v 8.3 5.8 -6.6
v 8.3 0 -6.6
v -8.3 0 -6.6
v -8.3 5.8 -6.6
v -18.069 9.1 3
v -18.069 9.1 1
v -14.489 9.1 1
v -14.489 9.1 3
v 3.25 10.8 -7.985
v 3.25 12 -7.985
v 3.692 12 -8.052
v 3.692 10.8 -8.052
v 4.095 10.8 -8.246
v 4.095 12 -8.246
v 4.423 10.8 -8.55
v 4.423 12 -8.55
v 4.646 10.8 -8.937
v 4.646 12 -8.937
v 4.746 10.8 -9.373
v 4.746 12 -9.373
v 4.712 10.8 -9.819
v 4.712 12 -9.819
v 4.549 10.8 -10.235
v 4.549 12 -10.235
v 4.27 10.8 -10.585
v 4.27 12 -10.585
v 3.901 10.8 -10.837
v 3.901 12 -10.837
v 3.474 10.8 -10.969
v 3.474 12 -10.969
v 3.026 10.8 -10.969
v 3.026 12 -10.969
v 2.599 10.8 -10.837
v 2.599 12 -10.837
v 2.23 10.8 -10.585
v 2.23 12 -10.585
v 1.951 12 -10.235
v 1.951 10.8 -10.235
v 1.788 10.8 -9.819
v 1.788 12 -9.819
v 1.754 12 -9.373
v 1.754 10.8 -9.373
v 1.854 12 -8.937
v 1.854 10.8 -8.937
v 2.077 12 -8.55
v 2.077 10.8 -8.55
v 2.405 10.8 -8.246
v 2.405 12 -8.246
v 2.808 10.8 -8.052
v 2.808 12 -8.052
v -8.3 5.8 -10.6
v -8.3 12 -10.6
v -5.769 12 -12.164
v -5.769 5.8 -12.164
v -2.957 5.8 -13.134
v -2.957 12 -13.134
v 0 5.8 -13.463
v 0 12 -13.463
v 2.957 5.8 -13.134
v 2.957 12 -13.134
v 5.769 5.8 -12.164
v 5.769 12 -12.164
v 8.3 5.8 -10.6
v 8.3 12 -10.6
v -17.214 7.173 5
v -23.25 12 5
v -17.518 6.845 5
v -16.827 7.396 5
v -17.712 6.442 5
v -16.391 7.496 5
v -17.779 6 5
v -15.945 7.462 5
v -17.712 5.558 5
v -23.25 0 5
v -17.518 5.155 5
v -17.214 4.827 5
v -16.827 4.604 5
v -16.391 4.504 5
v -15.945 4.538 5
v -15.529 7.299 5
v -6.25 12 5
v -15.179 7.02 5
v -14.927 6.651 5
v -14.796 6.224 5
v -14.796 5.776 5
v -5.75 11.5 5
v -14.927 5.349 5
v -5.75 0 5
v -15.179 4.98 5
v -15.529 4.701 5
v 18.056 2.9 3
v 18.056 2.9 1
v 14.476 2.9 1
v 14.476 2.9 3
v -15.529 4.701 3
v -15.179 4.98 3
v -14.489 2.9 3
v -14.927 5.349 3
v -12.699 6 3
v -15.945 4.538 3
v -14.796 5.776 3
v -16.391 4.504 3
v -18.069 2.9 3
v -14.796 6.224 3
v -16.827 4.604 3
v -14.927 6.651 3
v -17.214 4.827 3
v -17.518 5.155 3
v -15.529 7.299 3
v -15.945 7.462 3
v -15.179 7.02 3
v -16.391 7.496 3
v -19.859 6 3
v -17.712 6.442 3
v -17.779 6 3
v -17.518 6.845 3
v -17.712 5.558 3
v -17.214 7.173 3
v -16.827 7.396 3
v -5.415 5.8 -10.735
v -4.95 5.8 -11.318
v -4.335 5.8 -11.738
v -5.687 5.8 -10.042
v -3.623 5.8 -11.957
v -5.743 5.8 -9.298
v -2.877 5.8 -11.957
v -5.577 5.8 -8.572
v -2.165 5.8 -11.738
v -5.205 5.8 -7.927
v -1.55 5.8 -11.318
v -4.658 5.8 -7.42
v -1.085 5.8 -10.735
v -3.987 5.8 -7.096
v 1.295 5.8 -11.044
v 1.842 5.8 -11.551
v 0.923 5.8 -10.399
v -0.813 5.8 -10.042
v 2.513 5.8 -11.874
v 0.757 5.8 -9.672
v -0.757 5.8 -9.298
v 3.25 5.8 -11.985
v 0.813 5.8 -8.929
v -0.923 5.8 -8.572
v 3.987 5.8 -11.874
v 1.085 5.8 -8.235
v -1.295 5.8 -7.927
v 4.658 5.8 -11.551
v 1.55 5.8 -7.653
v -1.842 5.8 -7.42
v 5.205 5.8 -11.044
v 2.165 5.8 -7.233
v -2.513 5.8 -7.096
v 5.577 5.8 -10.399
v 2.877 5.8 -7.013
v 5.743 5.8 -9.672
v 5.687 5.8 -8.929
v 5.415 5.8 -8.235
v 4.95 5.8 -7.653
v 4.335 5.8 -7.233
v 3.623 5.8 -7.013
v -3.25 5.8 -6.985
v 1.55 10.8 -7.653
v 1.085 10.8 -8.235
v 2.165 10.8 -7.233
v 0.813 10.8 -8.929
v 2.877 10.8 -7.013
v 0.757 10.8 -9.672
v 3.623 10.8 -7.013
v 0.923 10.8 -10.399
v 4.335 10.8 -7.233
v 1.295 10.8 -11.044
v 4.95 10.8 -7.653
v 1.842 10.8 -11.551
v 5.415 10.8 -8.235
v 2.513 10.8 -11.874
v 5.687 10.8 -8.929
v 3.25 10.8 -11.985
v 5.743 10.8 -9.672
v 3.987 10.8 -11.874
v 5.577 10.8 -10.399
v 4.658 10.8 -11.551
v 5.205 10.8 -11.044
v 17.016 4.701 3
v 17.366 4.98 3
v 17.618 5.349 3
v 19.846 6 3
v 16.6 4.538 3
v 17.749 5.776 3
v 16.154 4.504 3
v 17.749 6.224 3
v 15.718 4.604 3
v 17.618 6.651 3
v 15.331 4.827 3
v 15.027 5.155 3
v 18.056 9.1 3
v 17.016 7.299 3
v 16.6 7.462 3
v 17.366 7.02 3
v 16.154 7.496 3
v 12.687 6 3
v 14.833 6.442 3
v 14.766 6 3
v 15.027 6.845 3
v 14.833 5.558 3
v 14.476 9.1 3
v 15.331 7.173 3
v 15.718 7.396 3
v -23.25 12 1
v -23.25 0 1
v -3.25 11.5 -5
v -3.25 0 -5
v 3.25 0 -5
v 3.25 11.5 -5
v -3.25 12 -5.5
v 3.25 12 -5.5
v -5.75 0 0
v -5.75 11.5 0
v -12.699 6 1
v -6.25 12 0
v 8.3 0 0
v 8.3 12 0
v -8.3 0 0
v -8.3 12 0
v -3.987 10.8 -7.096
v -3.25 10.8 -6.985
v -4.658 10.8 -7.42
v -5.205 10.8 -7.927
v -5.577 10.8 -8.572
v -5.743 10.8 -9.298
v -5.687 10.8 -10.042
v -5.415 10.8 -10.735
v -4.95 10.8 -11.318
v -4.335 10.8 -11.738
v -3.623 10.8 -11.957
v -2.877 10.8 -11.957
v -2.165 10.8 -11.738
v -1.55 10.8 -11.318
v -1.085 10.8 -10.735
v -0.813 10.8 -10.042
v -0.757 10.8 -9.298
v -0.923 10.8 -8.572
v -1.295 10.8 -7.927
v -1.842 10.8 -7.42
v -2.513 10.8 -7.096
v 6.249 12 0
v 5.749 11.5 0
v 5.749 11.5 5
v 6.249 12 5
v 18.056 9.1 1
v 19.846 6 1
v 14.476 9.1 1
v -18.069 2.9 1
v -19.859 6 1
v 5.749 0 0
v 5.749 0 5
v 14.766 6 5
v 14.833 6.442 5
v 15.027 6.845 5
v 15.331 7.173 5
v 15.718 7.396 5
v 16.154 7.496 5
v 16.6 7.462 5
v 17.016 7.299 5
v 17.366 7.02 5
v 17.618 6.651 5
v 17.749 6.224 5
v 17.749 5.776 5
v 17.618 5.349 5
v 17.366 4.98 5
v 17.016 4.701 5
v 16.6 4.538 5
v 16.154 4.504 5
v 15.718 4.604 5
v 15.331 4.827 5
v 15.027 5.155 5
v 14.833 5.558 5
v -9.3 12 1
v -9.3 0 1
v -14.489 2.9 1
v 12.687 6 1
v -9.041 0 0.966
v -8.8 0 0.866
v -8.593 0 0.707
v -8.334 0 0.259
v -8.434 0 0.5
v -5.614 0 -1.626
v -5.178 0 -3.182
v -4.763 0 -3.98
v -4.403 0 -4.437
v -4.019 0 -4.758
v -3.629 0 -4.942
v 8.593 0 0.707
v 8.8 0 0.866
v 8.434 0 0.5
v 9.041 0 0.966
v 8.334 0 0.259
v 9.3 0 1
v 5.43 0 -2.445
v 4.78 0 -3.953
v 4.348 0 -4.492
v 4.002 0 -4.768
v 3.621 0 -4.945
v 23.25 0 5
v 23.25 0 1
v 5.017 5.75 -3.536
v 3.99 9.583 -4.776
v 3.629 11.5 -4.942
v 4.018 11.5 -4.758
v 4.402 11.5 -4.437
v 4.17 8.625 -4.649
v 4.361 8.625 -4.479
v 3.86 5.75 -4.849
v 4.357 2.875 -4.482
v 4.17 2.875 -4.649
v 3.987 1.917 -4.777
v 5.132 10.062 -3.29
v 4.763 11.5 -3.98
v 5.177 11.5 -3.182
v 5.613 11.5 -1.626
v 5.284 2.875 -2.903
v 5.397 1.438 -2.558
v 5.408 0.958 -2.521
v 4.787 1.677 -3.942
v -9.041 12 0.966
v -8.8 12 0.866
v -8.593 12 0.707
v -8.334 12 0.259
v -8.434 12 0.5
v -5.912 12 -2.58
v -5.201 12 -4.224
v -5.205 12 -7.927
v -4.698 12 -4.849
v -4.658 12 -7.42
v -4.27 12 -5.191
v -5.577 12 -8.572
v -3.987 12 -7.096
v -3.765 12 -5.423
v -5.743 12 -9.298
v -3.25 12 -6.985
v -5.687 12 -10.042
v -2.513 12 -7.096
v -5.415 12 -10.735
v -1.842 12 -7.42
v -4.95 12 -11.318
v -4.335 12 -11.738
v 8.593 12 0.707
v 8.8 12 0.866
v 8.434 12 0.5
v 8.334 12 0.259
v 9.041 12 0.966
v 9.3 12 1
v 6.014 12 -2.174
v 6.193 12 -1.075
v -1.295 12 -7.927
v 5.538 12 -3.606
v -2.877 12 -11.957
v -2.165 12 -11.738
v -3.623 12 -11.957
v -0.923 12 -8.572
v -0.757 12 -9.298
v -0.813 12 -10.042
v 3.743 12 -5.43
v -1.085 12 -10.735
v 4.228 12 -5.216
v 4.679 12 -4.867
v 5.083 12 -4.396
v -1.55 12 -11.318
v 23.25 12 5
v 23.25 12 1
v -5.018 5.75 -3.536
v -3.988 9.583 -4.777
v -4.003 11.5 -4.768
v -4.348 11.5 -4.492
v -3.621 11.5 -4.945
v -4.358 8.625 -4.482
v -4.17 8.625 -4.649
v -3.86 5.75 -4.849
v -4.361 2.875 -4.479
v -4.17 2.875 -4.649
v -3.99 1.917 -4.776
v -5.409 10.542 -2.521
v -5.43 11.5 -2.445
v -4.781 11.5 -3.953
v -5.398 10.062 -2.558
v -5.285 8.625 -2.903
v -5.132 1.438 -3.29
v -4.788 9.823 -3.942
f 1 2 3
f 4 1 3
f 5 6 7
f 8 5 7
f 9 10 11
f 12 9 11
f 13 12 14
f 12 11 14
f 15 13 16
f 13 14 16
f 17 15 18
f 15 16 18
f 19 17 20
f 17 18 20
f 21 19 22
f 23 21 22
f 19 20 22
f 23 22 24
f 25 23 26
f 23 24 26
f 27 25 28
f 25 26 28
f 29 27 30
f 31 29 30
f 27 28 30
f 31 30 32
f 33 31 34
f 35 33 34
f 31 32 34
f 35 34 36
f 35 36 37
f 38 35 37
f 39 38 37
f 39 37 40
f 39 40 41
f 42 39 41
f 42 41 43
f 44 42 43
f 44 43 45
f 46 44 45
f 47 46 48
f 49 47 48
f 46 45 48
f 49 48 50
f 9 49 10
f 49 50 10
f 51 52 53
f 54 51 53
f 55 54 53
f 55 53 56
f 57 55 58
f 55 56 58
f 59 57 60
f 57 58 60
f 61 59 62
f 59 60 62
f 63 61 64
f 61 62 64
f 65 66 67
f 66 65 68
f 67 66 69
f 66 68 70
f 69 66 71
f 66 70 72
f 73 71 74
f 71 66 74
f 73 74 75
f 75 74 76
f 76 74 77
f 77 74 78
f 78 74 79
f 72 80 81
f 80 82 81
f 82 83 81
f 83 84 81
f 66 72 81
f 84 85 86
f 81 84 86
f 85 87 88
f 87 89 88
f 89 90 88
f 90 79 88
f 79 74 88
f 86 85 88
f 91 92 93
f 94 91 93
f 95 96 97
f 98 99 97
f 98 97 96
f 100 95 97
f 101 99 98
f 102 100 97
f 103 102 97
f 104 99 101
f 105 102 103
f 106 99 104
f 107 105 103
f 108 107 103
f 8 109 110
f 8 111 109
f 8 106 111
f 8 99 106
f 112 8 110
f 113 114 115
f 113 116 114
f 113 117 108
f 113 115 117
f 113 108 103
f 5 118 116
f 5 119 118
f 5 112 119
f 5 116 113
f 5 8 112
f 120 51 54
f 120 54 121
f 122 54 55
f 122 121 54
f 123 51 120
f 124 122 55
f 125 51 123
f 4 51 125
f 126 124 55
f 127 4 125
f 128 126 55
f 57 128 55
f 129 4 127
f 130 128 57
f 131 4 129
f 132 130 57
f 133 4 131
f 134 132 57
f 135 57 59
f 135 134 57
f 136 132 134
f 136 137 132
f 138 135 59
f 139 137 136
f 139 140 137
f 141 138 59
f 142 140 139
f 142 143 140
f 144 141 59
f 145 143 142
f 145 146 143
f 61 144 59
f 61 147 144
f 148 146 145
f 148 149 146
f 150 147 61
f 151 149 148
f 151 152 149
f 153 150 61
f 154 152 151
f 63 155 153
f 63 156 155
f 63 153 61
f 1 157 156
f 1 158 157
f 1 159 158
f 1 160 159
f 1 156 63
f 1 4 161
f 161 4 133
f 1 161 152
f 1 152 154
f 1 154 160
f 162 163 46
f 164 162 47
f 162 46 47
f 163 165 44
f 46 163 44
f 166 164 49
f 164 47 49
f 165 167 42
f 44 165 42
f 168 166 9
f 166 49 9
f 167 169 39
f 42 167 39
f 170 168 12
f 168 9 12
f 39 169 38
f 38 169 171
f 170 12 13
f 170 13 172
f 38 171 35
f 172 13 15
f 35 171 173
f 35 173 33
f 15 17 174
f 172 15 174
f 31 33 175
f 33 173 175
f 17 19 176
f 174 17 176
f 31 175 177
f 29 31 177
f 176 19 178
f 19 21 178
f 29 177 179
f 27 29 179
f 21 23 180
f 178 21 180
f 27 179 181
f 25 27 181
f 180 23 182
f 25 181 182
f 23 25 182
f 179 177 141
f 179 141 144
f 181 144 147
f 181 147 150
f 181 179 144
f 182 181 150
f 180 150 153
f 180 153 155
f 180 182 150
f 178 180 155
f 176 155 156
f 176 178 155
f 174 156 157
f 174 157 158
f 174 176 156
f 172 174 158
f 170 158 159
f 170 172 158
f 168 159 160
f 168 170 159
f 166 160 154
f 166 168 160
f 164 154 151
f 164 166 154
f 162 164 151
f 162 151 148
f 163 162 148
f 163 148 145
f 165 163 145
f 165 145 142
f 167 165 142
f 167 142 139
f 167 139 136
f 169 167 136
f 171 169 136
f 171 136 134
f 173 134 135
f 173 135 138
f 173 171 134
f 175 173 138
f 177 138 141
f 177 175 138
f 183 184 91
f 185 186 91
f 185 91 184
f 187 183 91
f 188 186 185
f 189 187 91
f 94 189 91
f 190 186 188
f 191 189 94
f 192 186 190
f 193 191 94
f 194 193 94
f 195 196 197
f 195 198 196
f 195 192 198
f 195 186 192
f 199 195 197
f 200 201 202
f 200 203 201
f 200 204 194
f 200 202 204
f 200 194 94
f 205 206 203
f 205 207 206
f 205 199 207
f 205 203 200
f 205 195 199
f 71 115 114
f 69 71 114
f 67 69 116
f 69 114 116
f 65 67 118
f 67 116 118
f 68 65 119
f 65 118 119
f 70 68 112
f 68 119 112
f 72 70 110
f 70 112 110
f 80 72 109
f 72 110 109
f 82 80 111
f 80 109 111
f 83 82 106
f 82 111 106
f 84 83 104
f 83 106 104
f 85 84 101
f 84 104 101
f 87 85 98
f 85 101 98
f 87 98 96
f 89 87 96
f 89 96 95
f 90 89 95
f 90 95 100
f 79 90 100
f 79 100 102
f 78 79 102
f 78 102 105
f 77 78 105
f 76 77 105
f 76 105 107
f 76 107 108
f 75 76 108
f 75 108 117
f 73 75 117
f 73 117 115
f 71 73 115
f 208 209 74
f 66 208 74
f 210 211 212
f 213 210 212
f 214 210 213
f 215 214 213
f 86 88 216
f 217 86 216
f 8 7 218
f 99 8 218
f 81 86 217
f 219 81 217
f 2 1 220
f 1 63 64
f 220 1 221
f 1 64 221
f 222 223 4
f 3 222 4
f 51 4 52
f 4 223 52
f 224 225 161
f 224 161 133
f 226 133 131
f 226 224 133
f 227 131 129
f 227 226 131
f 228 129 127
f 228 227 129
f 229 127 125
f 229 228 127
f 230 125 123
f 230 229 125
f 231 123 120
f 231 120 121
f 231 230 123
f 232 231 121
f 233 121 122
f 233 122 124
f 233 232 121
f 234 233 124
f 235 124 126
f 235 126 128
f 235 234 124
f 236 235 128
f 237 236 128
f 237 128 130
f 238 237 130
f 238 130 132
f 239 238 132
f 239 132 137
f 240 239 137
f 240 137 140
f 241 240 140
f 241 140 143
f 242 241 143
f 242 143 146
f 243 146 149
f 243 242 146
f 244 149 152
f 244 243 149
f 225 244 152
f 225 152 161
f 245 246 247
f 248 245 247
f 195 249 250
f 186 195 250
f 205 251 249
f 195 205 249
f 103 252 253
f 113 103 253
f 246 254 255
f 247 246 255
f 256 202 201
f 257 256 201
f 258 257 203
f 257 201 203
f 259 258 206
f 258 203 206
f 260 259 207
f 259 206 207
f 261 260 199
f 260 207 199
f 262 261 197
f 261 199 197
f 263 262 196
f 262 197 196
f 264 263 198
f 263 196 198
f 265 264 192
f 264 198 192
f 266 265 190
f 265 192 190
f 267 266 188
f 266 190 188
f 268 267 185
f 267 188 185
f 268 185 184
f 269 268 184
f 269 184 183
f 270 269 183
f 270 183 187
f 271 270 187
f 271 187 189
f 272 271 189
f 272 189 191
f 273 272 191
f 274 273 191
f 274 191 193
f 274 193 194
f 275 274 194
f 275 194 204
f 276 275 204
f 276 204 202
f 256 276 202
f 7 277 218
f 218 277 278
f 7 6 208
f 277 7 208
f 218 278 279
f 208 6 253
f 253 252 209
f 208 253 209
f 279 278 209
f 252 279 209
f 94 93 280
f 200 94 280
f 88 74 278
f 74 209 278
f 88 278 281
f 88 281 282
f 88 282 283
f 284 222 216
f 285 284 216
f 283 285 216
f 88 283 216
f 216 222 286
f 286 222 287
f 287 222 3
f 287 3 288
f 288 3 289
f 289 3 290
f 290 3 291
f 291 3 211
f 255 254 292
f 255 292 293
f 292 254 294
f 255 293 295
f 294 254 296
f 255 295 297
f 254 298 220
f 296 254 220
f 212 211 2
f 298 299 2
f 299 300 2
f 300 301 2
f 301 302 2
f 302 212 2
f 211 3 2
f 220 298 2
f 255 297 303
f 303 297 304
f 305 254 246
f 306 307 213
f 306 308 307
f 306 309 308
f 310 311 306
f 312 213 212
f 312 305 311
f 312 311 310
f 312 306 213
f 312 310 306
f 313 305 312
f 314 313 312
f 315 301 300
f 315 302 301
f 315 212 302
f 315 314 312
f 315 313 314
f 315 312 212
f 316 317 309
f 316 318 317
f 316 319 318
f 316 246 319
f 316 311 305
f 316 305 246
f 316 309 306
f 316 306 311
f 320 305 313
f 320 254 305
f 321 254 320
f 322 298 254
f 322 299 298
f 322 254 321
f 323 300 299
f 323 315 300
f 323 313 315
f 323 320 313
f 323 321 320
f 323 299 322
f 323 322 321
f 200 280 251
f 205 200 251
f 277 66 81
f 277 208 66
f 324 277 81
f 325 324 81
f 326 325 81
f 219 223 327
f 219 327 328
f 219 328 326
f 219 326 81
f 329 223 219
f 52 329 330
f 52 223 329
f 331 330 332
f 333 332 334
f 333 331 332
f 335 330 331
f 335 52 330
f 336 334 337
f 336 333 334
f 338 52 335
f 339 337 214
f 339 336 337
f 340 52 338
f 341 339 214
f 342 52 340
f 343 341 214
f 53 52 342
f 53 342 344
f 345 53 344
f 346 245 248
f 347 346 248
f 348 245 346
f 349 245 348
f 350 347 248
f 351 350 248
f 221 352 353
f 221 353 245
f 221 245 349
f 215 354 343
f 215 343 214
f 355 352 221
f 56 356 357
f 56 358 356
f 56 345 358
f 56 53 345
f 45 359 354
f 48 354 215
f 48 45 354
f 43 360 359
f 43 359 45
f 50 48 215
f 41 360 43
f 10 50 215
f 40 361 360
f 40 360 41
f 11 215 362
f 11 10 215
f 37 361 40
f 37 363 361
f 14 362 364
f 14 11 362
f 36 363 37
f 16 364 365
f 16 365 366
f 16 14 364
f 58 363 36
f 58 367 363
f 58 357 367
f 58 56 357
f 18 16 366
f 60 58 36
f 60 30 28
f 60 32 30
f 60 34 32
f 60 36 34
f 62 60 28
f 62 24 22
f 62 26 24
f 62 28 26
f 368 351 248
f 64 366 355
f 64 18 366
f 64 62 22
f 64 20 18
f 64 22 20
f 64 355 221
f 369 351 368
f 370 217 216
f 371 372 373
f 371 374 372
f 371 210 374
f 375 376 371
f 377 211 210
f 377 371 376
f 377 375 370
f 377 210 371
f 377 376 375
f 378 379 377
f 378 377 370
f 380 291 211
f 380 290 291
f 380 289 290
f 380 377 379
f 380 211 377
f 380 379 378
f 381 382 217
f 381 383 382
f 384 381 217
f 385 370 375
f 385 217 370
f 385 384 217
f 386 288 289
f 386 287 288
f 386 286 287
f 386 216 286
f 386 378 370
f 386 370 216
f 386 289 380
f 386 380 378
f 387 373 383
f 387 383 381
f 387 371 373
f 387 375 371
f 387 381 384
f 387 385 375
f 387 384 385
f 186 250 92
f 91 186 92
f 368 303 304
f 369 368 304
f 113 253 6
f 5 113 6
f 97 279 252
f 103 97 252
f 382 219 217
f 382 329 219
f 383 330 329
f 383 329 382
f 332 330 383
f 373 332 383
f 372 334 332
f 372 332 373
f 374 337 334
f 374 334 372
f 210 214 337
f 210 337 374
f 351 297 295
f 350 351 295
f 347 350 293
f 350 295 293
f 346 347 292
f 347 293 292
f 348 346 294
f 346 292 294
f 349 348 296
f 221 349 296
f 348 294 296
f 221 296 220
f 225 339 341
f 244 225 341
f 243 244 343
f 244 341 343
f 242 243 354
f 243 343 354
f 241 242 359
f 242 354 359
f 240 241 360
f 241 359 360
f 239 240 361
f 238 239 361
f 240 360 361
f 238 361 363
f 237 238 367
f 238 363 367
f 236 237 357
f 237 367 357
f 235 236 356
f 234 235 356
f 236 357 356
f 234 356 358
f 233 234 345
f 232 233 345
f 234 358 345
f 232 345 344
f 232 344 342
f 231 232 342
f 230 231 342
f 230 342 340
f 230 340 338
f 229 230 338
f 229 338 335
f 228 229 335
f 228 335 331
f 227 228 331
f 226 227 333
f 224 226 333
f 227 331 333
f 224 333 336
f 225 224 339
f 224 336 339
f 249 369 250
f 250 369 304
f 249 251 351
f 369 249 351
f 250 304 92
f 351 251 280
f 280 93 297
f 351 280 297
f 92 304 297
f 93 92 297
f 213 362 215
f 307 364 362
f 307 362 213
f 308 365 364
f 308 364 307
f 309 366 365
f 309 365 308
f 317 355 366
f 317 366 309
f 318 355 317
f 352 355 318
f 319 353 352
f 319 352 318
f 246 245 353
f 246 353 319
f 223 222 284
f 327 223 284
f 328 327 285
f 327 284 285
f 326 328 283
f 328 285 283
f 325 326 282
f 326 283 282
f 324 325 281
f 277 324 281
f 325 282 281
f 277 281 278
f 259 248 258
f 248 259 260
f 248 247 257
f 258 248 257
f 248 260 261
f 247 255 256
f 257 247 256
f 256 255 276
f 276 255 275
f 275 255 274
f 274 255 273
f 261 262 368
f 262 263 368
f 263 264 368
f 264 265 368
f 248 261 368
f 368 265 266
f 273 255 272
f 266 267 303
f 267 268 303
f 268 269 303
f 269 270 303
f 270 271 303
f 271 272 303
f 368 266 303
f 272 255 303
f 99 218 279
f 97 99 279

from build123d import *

# Parameters (mm, degrees)
BOSS_EXTRUDE1_DEPTH = 12
CUT_EXTRUDE1_DEPTH  = 2
SKETCH3_R           = 2.5
SKETCH3_R_2         = 1.5
BOSS_EXTRUDE2_DEPTH = 1.2
SKETCH4_R           = 2.5
BOSS_EXTRUDE3_DEPTH = 5
CHAMFER1_SIZE       = 0.5
SKETCH5_R           = 1.5
CUT_EXTRUDE2_DEPTH  = 5


with BuildPart() as part:
    # Sketch1 → Boss-Extrude1 (new body)
    with BuildSketch(Plane(origin=(0, 0, 0), x_dir=(1, 0, 0), z_dir=(0, 1, 0))):
        with BuildLine():
            Line((-23.25, -5), (-5.749755012, -5))
            Line((-5.749755012, -5), (-5.749755012, 0))
            add(Edge.make_bspline(
                [(-3.25, 5), (-5.749755012, 5), (-5.749755012, 0)],
                knots=[0, 0, 0, 1.570796327, 1.570796327, 1.570796327], degree=2, weights=[1, 0.707106781, 1]))
            Line((-3.25, 5), (3.25, 5))
            add(Edge.make_bspline(
                [(5.748694825, 0), (5.748694825, 5), (3.25, 5)],
                knots=[4.71238898, 4.71238898, 4.71238898, 6.283185307, 6.283185307, 6.283185307], degree=2, weights=[1, 0.707106781, 1]))
            Line((5.748694825, 0), (5.748694825, -5))
            Line((5.748694825, -5), (23.25, -5))
            Line((23.25, -5), (23.25, -3))
            Line((23.25, -3), (23.25, -1))
            Line((23.25, -1), (9.3, -1))
            ThreePointArc((9.3, -1), (8.592893219, -0.707106781), (8.3, 0))
            Line((8.3, 0), (8.3, 6.6))
            Line((8.3, 6.6), (-8.3, 6.6))
            Line((-8.3, 6.6), (-8.3, 0))
            ThreePointArc((-8.3, 0), (-8.592893219, -0.707106781), (-9.3, -1))
            Line((-9.3, -1), (-23.25, -1))
            Line((-23.25, -1), (-23.25, -5))
        make_face()
    extrude(amount=BOSS_EXTRUDE1_DEPTH)

    # Sketch2 → Cut-Extrude1 (cut)
    with BuildSketch(Plane(origin=(0, 0, 1), x_dir=(-1, 0, 0), z_dir=(0, 0, -1))):
        Polygon((19.85850269, 6), (18.068716856, 9.1), (14.489145187, 9.1), (12.699359352, 6), (14.489145187, 2.9), (18.068716856, 2.9), align=None)
        Polygon((-12.686507152, 6), (-14.476292987, 9.1), (-18.055864656, 9.1), (-19.84565049, 6), (-18.055864656, 2.9), (-14.476292987, 2.9), align=None)
    extrude(amount=-CUT_EXTRUDE1_DEPTH, mode=Mode.SUBTRACT)

    # Sketch3 → Boss-Extrude2 (add)
    with BuildSketch(Plane(origin=(0, 12, 0), x_dir=(1, 0, 0), z_dir=(0, 1, 0))):
        with BuildLine():
            Line((-8.3, 6.6), (8.3, 6.6))
            Line((8.3, 6.6), (8.3, 10.6))
            ThreePointArc((8.3, 10.6), (0, 13.462912018), (-8.3, 10.6))
            Line((-8.3, 10.6), (-8.3, 6.6))
        make_face()
        with Locations(Location((-3.25, 9.48526903, 0), (0, 0, 270))):
            Circle(SKETCH3_R, mode=Mode.SUBTRACT)
        with Locations(Location((3.25, 9.48526903, 0), (0, 0, 270))):
            Circle(SKETCH3_R_2, mode=Mode.SUBTRACT)
    extrude(amount=-BOSS_EXTRUDE2_DEPTH)

    # Sketch4 → Boss-Extrude3 (add)
    with BuildSketch(Plane.XZ.offset(-10.8)):
        with BuildLine():
            Line((8.3, -6.6), (-8.3, -6.6))
            Line((-8.3, -6.6), (-8.3, -10.6))
            ThreePointArc((-8.3, -10.6), (0, -13.462912018), (8.3, -10.6))
            Line((8.3, -10.6), (8.3, -6.6))
        make_face()
        with Locations(Location((-3.25, -9.48526903, 0), (0, 0, 90))):
            Circle(SKETCH4_R, mode=Mode.SUBTRACT)
        with Locations(Location((3.25, -9.48526903, 0), (0, 0, 270))):
            Circle(SKETCH4_R, mode=Mode.SUBTRACT)
    extrude(amount=BOSS_EXTRUDE3_DEPTH)

    # Chamfer1
    chamfer1_edges = [part.edges().sort_by_distance(p)[0] for p in [
        (0, 12, -5),
        (-5.260112096, 12, -2.972310439),
        (5.259369228, 12, -2.972013605),
        (-5.749755012, 12, 2.5),
        (5.748694825, 12, 2.5),
    ]]
    chamfer(chamfer1_edges, length=CHAMFER1_SIZE)

    # Sketch5 → Cut-Extrude2 (cut)
    with BuildSketch(Plane(origin=(0, 0, 1), x_dir=(-1, 0, 0), z_dir=(0, 0, -1))):
        with Locations((-16.266078821, 6)):
            Circle(SKETCH5_R)
        with Locations((16.278931021, 6)):
            Circle(SKETCH5_R)
    extrude(amount=-CUT_EXTRUDE2_DEPTH, mode=Mode.SUBTRACT)


solid = part.part
